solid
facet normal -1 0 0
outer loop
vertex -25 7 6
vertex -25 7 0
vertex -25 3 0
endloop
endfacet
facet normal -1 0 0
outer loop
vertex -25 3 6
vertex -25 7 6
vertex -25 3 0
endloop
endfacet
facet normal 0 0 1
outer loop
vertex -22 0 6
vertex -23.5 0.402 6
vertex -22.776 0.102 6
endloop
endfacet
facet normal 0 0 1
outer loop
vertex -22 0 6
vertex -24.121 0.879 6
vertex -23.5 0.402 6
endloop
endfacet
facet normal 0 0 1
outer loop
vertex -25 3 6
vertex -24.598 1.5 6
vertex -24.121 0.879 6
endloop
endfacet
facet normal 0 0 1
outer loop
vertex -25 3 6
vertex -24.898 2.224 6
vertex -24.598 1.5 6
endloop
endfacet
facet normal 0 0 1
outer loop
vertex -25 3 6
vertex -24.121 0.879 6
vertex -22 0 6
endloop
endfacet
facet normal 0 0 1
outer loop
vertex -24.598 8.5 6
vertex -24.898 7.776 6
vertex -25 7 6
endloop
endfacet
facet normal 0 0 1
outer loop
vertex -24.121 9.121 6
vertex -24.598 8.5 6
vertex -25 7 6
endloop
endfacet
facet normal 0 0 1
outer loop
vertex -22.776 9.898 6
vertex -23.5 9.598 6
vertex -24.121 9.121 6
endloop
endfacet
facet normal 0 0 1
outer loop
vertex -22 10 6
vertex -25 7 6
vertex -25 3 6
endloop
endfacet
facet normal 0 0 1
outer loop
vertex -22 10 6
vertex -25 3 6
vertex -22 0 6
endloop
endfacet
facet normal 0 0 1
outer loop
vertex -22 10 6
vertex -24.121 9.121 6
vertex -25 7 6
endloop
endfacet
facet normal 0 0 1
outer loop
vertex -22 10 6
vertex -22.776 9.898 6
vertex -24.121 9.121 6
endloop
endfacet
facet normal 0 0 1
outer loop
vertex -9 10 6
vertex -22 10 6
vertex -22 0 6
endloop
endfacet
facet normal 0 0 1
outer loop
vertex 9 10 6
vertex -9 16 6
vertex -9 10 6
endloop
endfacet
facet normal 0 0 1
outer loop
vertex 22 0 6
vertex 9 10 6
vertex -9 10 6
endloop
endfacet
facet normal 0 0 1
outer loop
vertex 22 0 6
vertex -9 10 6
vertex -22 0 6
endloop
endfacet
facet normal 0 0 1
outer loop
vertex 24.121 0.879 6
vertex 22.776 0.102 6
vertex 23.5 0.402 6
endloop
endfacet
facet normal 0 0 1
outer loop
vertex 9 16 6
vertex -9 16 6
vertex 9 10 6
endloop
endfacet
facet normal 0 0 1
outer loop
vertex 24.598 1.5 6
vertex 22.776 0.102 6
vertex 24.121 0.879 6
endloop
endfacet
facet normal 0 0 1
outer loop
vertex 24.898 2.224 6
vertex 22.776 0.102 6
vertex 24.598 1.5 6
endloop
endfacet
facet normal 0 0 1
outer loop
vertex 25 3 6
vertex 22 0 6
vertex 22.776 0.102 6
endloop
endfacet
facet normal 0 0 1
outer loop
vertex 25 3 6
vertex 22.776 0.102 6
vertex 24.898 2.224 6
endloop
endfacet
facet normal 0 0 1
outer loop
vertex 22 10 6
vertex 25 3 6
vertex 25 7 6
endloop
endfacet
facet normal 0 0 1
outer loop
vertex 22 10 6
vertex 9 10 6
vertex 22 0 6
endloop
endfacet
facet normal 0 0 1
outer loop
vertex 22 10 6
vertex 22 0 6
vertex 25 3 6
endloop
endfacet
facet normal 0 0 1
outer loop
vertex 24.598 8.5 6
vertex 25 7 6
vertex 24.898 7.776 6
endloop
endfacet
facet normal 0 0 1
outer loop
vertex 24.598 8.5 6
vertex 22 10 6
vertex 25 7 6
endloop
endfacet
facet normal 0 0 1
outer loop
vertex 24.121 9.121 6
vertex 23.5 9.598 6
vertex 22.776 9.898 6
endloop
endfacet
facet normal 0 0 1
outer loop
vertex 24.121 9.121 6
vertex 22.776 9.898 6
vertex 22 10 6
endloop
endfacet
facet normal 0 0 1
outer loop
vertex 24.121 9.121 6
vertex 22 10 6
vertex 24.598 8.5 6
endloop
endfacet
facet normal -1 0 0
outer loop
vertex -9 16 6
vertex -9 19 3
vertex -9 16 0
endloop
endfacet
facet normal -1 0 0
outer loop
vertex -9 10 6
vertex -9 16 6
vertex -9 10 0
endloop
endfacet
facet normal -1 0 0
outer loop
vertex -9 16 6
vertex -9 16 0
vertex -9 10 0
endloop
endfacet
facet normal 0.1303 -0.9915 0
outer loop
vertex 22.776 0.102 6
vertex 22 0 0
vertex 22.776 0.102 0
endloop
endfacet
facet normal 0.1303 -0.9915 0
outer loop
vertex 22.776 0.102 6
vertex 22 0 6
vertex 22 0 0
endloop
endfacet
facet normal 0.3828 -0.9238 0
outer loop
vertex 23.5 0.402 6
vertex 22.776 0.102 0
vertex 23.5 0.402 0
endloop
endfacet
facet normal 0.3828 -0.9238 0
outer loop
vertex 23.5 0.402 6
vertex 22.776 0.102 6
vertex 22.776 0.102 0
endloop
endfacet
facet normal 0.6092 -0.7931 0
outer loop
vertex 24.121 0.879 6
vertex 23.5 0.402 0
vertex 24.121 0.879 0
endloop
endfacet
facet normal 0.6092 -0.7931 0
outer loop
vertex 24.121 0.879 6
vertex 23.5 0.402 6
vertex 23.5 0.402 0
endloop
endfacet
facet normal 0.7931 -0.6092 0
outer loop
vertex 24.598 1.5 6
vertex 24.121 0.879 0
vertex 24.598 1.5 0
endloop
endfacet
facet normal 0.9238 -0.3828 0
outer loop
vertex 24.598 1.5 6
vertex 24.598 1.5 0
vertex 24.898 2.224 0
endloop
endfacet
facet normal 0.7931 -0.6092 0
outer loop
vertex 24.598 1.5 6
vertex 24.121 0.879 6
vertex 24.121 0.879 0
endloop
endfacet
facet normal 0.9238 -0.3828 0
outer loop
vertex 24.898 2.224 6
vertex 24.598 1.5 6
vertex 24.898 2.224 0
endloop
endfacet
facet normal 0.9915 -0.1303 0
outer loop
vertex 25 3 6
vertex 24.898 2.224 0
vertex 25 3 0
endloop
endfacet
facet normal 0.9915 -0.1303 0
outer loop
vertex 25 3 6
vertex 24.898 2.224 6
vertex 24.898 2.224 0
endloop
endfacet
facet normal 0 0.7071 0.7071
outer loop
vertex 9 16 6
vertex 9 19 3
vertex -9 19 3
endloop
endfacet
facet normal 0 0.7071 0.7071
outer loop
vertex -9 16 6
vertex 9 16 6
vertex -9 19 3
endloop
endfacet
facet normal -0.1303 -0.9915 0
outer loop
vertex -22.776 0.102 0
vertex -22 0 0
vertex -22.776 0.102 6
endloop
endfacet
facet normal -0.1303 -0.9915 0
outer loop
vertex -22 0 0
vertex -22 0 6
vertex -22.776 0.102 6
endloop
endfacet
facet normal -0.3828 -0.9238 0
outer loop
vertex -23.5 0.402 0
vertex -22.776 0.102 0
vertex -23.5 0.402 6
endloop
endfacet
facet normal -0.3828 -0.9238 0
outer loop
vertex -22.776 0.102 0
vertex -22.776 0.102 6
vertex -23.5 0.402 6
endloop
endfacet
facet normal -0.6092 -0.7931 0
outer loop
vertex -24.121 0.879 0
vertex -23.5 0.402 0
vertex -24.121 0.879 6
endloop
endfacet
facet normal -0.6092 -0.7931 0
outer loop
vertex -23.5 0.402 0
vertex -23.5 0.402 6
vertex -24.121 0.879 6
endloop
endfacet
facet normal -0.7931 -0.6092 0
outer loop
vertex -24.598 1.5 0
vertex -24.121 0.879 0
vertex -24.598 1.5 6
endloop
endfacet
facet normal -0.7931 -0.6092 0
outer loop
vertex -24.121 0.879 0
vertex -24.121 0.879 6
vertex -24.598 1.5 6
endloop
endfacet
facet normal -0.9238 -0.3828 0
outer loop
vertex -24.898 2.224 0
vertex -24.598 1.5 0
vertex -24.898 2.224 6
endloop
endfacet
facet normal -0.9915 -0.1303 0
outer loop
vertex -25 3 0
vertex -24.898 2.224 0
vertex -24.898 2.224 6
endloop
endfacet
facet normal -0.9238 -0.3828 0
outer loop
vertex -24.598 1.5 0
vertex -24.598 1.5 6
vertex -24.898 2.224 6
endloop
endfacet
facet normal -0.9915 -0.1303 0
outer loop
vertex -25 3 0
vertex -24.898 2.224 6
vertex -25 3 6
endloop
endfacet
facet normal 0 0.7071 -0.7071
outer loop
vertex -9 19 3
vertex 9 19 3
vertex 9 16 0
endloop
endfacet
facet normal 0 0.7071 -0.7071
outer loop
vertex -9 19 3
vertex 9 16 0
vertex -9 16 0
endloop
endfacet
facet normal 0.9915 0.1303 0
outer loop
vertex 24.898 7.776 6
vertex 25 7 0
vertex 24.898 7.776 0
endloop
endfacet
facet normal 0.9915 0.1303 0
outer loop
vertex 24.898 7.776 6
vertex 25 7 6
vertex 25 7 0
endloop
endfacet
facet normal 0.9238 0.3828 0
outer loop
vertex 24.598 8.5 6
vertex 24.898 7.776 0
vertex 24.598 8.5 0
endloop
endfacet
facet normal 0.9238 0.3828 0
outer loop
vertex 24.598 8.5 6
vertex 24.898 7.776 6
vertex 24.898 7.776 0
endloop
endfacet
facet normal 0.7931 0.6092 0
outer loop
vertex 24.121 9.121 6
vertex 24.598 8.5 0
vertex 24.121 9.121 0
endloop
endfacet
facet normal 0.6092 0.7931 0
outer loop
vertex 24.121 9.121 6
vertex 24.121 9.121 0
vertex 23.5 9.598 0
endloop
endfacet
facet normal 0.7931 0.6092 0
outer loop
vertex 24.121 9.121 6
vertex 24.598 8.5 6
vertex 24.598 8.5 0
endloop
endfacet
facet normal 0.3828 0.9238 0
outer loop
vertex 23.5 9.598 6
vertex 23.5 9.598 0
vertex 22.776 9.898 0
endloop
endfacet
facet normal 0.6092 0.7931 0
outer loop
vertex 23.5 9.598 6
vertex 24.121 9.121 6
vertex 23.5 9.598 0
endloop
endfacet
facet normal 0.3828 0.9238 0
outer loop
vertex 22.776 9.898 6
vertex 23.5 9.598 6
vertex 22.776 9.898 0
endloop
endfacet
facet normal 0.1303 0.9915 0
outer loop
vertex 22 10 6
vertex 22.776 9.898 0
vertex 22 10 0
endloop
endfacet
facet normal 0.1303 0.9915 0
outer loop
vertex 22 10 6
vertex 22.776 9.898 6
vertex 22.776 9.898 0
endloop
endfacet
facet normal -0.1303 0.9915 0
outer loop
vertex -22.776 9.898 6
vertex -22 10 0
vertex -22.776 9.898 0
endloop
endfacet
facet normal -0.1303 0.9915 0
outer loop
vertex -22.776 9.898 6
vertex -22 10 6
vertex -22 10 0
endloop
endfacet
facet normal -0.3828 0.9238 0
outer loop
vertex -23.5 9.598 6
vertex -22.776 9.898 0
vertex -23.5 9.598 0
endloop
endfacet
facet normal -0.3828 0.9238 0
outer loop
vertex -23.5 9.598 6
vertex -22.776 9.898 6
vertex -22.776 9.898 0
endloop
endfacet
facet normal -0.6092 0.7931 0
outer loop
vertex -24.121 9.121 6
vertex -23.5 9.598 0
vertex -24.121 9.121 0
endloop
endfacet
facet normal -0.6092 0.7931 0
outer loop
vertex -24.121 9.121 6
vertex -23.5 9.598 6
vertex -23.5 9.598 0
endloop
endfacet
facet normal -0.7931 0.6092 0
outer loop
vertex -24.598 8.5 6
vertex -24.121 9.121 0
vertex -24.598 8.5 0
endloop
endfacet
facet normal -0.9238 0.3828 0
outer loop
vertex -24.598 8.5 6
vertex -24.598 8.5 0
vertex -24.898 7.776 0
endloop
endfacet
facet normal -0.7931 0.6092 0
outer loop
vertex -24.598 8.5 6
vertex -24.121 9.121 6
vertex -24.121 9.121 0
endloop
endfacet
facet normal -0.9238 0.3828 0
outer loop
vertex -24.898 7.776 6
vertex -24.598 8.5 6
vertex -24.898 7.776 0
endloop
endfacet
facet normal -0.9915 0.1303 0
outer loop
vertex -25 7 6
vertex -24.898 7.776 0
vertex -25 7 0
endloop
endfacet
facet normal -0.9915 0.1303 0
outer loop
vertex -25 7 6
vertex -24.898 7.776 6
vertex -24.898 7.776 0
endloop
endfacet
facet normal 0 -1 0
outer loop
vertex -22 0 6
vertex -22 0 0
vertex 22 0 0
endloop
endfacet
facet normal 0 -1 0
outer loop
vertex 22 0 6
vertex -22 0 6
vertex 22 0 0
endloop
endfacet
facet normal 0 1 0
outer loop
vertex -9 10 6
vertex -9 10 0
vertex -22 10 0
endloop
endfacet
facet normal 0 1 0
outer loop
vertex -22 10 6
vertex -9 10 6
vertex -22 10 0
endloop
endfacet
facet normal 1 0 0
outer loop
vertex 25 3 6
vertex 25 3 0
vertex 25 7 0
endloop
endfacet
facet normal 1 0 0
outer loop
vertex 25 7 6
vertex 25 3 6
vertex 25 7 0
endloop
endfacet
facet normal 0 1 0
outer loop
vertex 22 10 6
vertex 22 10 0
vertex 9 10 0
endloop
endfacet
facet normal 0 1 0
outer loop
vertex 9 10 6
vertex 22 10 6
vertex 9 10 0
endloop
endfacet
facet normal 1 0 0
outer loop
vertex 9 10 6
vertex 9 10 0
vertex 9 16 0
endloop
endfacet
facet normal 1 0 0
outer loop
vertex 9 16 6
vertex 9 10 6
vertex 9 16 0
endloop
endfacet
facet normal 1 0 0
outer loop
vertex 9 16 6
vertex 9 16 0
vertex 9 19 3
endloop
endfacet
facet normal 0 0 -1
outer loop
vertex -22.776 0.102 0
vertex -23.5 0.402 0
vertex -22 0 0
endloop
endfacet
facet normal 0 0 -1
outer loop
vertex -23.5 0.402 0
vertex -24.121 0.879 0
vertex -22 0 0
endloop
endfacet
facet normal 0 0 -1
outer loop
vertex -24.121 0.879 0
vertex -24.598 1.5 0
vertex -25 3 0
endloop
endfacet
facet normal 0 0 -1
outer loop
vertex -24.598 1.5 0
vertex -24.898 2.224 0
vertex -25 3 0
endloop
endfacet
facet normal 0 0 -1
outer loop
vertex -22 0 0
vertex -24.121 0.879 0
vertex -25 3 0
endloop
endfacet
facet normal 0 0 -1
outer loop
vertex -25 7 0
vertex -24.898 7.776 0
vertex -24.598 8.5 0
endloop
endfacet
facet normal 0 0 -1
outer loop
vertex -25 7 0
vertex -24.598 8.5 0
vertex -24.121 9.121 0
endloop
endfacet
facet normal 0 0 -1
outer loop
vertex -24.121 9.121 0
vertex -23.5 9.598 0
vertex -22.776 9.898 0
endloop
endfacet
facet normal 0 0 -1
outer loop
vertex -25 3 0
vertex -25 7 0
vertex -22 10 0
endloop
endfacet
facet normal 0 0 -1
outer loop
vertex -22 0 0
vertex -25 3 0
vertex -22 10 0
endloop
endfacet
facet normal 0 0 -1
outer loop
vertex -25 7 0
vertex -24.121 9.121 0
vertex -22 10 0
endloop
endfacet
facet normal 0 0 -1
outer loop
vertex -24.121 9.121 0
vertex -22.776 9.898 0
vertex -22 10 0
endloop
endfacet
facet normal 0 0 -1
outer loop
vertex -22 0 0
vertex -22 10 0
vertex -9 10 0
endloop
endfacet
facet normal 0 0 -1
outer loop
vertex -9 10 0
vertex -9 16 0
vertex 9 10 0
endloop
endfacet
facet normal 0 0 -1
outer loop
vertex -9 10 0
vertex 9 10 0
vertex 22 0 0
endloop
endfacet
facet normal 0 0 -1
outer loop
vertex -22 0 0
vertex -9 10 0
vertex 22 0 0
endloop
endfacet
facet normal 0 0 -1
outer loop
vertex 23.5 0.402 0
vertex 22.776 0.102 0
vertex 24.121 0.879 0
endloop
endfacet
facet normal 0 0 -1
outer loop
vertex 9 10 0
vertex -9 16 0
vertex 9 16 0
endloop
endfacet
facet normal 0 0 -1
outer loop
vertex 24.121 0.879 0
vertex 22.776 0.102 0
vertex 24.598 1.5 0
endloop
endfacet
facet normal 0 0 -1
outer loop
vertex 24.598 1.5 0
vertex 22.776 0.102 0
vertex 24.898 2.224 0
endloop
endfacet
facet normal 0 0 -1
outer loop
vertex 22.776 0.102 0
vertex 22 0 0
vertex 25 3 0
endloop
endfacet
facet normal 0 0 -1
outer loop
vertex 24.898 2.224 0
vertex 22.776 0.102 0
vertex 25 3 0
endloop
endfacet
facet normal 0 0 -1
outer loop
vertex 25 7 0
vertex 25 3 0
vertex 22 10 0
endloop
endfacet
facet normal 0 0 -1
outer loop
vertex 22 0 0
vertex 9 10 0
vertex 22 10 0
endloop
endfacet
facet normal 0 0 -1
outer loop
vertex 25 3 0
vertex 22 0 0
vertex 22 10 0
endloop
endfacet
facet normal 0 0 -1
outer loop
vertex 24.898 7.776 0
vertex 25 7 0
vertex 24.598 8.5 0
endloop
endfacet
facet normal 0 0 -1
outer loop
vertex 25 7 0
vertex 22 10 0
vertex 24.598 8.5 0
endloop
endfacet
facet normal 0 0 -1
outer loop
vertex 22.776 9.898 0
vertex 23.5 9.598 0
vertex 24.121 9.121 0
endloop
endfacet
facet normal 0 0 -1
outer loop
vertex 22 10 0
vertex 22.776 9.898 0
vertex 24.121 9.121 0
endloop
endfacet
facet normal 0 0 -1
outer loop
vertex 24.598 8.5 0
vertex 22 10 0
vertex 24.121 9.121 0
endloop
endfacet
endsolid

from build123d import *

# Parameters (mm, degrees)
EXTRUDE_1_DEPTH = 6
FILLET_1_R      = 3
CHAMFER_1_SIZE  = 3


with BuildPart() as part:
    # 草图1 → 凸台-拉伸1 (new body)
    with BuildSketch(Plane.XY):
        Polygon((-25, 0), (25, 0), (25, 10), (9, 10), (9, 19), (-9, 19), (-9, 10), (-25, 10), align=None)
    extrude(amount=EXTRUDE_1_DEPTH)

    # 圆角1
    fillet_1_edges = [part.edges().sort_by_distance(p)[0] for p in [
        (25, 10, 3),
        (25, 0, 3),
        (-25, 0, 3),
        (-25, 10, 3),
    ]]
    fillet(fillet_1_edges, radius=FILLET_1_R)

    # 倒角1
    chamfer_1_edges = [part.edges().sort_by_distance(p)[0] for p in [
        (0, 19, 6),
        (0, 19, 0),
    ]]
    chamfer(chamfer_1_edges, length=CHAMFER_1_SIZE - 0.0001)  # a hair under: the kernel refuses the full size


solid = part.part
